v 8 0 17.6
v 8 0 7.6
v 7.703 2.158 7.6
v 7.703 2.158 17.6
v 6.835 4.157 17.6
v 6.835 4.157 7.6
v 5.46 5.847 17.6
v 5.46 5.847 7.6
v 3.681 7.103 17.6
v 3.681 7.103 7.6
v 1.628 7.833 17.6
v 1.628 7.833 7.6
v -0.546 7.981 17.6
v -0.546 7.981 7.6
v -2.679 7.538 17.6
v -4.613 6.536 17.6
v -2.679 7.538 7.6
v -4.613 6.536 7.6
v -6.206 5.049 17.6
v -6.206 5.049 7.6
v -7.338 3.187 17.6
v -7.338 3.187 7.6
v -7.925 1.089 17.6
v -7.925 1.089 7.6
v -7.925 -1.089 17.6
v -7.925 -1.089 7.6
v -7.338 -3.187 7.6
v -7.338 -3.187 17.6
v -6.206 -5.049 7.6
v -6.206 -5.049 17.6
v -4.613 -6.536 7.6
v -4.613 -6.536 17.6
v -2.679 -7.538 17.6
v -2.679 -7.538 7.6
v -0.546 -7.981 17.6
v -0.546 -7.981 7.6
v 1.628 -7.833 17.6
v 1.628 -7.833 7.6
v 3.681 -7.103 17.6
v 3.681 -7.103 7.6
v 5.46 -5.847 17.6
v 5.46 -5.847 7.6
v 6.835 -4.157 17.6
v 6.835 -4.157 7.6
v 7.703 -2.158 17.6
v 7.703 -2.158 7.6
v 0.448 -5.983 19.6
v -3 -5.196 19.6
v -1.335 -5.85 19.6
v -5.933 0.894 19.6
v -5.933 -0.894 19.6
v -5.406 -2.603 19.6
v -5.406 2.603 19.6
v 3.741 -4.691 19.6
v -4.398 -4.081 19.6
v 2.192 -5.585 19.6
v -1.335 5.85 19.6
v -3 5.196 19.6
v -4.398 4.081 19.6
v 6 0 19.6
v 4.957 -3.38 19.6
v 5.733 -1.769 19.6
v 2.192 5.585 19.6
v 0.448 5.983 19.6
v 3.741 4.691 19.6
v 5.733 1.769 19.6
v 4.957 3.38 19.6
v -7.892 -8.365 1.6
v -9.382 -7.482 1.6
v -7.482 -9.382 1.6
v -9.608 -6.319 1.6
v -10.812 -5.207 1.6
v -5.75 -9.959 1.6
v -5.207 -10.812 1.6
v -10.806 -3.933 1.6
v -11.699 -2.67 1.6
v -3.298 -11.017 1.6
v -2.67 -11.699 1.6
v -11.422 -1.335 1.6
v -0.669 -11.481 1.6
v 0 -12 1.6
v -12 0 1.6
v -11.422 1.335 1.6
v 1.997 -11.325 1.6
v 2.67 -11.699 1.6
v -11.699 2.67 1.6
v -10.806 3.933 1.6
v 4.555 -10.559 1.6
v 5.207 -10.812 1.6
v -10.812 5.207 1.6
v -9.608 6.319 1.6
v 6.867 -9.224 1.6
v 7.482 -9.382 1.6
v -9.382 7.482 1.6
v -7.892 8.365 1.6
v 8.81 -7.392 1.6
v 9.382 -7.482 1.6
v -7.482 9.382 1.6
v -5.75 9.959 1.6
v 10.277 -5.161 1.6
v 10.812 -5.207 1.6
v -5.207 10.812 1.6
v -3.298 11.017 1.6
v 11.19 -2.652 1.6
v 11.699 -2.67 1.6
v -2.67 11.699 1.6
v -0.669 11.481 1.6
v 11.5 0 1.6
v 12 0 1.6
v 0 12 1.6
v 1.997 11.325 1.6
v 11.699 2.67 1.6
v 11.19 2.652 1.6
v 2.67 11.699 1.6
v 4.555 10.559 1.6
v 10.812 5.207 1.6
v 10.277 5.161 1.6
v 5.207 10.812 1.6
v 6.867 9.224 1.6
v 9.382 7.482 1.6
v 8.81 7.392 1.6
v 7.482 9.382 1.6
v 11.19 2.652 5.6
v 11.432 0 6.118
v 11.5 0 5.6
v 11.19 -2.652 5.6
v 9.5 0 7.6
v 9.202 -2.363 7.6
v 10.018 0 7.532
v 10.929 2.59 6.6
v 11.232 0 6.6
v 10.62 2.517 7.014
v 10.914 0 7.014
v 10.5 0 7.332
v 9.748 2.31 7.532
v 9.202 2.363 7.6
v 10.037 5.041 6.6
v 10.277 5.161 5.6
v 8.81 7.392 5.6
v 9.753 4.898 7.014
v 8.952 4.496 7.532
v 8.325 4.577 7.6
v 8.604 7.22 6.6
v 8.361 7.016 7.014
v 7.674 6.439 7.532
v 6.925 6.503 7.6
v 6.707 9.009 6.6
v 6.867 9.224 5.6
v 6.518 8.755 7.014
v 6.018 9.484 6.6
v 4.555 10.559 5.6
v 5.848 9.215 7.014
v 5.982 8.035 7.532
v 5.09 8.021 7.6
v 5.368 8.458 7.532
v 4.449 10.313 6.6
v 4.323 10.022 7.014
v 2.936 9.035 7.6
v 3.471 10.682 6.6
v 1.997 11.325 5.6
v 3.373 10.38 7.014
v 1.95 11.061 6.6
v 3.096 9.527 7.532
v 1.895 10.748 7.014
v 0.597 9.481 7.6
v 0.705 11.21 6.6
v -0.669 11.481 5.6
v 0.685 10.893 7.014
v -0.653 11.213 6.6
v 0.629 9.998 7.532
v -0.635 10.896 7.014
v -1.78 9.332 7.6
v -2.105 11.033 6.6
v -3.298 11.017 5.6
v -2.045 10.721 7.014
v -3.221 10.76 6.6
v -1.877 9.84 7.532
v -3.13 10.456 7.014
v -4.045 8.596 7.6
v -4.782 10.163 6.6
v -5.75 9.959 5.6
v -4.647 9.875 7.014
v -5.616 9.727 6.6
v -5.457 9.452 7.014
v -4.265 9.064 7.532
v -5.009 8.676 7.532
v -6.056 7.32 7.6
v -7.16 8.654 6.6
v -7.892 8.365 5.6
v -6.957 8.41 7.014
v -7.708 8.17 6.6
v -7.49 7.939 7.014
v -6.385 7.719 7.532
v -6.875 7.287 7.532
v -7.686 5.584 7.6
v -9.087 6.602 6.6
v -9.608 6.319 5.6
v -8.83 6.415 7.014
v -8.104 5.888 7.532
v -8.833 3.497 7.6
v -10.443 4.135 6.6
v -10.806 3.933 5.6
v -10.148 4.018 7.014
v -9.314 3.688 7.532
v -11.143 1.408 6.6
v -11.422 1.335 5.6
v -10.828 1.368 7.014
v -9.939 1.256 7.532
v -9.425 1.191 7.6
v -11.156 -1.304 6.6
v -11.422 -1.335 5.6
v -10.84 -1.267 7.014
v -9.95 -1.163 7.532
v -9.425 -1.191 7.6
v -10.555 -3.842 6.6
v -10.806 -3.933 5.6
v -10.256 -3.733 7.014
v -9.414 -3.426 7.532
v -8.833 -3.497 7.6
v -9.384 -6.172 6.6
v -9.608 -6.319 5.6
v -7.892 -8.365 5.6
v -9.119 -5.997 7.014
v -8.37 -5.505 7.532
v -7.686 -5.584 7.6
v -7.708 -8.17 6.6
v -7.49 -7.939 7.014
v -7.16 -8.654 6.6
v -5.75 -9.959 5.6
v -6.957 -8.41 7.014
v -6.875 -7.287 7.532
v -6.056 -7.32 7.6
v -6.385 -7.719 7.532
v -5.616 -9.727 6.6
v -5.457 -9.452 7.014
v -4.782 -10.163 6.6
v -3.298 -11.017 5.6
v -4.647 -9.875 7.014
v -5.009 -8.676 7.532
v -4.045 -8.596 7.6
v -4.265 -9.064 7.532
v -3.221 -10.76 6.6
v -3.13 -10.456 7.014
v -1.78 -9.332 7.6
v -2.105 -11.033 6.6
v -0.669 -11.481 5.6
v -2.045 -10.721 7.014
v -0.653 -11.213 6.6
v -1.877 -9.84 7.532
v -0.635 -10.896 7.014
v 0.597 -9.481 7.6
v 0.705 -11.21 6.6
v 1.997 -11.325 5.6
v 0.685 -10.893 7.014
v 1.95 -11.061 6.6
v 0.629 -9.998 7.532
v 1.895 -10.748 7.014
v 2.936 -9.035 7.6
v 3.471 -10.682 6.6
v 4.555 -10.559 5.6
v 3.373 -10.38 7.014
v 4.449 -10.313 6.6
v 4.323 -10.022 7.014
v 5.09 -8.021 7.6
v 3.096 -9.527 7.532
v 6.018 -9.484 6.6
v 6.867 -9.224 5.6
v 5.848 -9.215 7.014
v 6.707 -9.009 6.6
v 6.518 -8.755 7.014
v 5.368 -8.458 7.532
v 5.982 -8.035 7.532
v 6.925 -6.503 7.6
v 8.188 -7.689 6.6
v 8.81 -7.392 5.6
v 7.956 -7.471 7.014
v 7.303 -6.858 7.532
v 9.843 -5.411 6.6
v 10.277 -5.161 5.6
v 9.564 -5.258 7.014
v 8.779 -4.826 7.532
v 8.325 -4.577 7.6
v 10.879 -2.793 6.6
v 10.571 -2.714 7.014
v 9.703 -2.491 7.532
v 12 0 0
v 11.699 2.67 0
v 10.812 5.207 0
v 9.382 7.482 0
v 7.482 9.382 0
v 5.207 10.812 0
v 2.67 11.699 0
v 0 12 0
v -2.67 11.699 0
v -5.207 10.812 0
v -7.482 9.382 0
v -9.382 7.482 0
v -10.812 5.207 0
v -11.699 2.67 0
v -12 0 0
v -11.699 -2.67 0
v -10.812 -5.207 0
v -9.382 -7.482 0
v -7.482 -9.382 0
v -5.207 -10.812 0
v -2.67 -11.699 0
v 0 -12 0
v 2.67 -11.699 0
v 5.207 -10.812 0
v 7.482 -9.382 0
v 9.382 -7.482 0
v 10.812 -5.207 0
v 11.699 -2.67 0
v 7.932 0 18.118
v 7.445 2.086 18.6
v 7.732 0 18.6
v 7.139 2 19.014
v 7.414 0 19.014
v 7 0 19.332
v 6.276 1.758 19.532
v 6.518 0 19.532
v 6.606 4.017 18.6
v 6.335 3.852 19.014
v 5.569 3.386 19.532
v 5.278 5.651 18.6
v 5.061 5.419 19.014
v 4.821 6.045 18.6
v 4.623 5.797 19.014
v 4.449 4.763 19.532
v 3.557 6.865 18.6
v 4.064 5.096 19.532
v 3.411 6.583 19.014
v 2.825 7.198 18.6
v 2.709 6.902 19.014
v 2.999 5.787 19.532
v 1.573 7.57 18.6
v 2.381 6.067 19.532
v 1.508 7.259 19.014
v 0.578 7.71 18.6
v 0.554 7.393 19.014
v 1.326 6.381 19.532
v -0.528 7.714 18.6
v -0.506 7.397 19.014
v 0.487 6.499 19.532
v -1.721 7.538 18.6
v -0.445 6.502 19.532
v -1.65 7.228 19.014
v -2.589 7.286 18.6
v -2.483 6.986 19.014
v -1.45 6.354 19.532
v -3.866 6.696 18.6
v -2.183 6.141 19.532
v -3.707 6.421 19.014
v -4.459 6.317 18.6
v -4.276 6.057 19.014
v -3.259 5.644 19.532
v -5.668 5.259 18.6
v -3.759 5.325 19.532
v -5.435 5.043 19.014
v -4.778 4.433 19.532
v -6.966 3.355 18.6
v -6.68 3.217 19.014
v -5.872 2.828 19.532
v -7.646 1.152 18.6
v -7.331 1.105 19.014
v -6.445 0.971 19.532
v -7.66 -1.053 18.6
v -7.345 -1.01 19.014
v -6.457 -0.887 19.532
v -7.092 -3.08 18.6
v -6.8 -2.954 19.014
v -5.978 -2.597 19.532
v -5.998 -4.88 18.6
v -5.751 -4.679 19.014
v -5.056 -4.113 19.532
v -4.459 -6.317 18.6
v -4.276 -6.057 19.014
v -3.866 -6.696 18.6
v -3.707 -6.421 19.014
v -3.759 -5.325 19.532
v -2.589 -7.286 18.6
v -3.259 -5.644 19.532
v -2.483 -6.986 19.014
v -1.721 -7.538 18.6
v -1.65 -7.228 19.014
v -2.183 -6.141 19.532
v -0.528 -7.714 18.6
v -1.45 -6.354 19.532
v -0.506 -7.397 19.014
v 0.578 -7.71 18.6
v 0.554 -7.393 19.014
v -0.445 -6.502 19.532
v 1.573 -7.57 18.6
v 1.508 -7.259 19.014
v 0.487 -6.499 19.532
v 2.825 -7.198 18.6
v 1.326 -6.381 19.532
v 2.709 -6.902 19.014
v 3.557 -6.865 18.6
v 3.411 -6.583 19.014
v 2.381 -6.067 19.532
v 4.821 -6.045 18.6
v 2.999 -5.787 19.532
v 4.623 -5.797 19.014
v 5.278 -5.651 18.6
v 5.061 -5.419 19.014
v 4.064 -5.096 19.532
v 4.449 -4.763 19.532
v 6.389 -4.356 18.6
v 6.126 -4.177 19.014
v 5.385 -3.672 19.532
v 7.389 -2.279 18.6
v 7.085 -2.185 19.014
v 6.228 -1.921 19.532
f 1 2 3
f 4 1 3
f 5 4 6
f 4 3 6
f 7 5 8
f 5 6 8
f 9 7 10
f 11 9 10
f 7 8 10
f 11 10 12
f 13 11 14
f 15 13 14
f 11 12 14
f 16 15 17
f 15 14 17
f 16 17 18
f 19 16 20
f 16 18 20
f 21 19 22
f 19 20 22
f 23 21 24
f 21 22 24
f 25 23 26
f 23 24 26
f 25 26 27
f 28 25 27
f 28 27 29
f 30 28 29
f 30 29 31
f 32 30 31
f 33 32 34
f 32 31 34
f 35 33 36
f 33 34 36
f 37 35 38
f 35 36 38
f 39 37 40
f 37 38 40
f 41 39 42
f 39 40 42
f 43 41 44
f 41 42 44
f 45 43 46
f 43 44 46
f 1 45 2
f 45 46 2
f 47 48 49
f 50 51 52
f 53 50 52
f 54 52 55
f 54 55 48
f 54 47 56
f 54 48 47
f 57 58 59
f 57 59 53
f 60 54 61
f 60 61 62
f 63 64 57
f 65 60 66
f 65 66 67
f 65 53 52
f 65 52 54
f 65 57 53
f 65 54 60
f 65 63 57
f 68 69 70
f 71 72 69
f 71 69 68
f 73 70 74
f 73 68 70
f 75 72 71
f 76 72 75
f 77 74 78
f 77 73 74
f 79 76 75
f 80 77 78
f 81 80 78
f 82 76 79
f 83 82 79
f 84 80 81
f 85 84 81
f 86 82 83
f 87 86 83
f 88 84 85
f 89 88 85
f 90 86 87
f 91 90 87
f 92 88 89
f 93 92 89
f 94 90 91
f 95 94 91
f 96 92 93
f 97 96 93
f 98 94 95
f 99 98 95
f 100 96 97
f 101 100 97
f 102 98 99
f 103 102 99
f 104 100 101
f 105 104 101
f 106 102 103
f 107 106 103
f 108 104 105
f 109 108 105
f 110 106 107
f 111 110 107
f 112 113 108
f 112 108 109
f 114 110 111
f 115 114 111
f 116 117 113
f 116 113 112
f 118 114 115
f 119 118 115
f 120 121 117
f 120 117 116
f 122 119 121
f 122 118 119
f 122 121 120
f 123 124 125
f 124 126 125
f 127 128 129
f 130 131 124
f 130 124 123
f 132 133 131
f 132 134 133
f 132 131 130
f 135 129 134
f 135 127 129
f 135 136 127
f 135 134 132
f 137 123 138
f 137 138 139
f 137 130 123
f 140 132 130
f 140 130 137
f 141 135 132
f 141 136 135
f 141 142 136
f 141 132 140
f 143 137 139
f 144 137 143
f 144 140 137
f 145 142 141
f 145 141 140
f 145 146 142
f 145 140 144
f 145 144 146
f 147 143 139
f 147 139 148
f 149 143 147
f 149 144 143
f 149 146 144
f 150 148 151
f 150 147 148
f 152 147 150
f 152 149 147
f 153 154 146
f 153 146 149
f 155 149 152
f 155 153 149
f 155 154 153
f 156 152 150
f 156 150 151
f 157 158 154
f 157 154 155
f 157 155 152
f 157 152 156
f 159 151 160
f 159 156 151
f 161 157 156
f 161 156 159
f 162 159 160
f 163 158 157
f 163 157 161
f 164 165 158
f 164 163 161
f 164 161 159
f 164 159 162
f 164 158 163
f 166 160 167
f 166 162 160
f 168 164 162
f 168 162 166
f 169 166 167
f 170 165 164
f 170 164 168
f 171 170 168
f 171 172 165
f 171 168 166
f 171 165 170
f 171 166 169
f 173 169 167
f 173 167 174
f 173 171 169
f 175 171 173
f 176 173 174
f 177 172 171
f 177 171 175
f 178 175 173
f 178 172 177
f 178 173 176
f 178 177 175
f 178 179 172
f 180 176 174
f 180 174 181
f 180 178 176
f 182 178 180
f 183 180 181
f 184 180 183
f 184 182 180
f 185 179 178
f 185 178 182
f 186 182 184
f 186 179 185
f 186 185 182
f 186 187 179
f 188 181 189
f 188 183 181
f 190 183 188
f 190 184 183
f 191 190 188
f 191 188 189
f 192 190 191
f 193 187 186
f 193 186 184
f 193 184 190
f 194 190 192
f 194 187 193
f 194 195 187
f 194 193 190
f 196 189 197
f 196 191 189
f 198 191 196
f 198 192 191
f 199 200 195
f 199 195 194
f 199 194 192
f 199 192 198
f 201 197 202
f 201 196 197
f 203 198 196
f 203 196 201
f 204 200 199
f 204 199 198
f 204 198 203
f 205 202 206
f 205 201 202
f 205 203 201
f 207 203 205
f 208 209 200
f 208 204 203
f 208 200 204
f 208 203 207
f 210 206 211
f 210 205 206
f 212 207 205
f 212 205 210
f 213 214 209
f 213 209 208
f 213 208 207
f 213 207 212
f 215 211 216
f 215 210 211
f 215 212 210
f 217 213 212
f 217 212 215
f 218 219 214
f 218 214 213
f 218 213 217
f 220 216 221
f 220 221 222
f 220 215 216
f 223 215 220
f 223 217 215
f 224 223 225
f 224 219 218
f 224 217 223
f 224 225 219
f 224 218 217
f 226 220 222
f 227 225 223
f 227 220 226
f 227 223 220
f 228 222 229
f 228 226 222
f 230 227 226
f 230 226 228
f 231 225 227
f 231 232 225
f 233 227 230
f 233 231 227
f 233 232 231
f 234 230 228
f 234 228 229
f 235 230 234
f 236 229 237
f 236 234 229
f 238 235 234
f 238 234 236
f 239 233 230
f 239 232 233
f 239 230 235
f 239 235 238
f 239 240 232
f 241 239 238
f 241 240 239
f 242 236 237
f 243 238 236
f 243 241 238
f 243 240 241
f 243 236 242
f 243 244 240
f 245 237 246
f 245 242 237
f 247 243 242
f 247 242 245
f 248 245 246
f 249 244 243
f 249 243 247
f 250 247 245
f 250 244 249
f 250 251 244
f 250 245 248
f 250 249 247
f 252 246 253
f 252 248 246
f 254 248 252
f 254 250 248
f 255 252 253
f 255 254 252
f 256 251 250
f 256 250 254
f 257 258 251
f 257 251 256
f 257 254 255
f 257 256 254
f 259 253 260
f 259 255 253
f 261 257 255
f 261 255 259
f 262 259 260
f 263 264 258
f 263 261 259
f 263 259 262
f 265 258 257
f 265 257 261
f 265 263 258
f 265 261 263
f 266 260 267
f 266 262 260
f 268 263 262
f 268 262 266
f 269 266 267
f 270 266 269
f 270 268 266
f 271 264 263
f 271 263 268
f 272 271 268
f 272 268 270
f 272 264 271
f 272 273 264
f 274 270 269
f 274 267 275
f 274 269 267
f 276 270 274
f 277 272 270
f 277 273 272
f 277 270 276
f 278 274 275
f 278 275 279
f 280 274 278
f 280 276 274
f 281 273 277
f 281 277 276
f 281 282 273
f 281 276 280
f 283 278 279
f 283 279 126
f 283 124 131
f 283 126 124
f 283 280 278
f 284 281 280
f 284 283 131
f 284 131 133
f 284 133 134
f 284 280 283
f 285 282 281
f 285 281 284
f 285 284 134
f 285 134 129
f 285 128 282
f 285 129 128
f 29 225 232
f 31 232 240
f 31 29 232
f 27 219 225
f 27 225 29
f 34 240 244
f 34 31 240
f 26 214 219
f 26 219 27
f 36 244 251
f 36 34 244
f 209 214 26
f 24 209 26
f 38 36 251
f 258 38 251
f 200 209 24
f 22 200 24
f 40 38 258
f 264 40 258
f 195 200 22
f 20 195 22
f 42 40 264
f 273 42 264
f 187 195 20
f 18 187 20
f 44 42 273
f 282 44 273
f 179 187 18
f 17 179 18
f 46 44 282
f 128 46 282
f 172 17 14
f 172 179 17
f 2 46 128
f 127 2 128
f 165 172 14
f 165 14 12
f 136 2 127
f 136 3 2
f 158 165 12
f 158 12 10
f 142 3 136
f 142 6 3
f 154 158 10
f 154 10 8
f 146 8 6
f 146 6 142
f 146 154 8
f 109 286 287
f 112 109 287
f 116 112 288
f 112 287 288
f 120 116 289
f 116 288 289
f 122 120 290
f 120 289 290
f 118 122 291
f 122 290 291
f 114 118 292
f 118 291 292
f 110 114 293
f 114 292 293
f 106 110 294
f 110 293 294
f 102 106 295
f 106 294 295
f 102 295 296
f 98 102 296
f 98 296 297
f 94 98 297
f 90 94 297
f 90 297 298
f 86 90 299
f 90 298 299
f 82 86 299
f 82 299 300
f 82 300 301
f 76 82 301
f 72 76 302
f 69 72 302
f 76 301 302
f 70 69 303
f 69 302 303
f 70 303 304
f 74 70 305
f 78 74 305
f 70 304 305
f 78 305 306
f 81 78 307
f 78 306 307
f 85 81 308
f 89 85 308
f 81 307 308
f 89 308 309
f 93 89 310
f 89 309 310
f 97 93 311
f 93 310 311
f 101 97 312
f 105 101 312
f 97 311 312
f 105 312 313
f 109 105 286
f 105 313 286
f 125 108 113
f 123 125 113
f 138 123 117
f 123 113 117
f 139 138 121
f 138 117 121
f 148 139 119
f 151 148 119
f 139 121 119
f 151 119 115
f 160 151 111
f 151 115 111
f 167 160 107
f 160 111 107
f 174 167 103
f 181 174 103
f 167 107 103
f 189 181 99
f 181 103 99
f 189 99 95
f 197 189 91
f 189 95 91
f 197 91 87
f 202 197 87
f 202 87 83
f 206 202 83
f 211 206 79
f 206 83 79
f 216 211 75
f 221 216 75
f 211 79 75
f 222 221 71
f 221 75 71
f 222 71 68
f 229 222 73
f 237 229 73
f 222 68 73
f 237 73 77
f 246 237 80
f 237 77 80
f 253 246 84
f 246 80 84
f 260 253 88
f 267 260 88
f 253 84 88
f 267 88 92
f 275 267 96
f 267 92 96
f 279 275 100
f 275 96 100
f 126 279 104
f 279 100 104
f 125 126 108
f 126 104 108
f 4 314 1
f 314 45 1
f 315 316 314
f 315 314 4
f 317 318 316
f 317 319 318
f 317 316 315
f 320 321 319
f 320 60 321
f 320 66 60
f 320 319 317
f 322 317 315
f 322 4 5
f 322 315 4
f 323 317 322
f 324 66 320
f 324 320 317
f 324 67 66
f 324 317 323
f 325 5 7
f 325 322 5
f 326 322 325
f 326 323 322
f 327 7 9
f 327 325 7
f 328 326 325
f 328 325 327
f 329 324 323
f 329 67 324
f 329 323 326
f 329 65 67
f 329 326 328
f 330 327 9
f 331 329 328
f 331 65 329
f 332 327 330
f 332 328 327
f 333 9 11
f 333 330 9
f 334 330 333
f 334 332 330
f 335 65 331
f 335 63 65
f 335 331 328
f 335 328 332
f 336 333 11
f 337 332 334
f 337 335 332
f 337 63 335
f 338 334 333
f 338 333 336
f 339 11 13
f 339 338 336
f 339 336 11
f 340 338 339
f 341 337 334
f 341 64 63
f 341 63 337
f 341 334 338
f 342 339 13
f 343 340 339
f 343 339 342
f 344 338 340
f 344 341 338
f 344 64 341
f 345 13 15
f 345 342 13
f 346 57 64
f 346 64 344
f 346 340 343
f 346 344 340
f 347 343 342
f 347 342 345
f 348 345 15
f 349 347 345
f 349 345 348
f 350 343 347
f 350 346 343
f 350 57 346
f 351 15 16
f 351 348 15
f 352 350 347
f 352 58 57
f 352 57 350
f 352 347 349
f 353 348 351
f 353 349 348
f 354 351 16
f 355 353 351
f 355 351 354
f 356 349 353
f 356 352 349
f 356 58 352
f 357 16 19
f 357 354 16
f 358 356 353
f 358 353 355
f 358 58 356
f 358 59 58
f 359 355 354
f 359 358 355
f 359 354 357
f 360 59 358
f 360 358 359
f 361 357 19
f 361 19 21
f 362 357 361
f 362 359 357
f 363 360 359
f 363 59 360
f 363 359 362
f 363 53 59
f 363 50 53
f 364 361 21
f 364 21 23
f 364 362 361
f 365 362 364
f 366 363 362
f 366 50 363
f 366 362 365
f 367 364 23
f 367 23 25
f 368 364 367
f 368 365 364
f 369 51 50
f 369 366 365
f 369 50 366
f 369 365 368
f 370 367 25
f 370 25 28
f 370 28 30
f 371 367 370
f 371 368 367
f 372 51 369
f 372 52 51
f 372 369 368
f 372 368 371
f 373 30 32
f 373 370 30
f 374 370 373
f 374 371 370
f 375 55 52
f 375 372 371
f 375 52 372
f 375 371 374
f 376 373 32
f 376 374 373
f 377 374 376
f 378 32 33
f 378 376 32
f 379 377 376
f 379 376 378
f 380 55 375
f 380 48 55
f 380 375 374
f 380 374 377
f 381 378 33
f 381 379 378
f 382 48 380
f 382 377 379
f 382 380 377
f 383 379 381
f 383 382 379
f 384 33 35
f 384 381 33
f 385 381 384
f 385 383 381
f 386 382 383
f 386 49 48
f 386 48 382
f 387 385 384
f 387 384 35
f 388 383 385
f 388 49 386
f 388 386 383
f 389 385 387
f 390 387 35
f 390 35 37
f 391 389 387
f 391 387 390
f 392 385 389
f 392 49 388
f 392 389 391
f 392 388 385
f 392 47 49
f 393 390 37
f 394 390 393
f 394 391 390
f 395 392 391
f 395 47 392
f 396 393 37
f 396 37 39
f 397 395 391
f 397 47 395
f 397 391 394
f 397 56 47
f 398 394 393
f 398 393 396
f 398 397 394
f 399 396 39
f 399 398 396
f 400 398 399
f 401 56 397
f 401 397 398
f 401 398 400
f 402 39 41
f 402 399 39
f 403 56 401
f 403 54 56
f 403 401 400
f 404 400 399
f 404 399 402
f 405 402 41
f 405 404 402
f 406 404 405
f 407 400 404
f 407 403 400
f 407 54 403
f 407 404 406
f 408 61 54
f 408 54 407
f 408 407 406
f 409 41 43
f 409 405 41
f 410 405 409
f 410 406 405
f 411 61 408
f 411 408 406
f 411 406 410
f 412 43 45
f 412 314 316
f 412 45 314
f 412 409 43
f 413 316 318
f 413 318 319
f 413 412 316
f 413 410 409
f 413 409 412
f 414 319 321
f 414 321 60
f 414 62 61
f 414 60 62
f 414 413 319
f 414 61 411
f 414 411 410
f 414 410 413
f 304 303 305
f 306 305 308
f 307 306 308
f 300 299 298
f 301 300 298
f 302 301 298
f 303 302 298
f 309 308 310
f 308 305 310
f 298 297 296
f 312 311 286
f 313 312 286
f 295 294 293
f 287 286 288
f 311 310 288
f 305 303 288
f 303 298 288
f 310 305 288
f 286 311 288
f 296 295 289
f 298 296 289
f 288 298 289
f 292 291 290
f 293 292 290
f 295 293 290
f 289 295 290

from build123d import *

# Parameters (mm, degrees)
F0_R     = 12
F1_DEPTH = 1.6
F2_R     = 11.5
F3_DEPTH = 6
F4_R     = 8
F5_DEPTH = 12
F6_R     = 2


with BuildPart() as f1:
    # F0 (on Top) → F1 (new body)
    with BuildSketch(Plane.XY):
        Circle(F0_R)
    extrude(amount=F1_DEPTH)

    # F2 (on face) → F3 (join)
    with BuildSketch(Plane.XY.offset(1.6)):
        Circle(F2_R)
    extrude(amount=F3_DEPTH)

    # F4 (on face) → F5 (join)
    with BuildSketch(Plane.XY.offset(7.6)):
        Circle(F4_R)
    extrude(amount=F5_DEPTH)

    # F6
    f6_edges = [f1.edges().sort_by_distance(p)[0] for p in [
        (-11.5, 0, 7.6),
        (-8, 0, 19.6),
    ]]
    fillet(f6_edges, radius=F6_R)


solid = f1.part
